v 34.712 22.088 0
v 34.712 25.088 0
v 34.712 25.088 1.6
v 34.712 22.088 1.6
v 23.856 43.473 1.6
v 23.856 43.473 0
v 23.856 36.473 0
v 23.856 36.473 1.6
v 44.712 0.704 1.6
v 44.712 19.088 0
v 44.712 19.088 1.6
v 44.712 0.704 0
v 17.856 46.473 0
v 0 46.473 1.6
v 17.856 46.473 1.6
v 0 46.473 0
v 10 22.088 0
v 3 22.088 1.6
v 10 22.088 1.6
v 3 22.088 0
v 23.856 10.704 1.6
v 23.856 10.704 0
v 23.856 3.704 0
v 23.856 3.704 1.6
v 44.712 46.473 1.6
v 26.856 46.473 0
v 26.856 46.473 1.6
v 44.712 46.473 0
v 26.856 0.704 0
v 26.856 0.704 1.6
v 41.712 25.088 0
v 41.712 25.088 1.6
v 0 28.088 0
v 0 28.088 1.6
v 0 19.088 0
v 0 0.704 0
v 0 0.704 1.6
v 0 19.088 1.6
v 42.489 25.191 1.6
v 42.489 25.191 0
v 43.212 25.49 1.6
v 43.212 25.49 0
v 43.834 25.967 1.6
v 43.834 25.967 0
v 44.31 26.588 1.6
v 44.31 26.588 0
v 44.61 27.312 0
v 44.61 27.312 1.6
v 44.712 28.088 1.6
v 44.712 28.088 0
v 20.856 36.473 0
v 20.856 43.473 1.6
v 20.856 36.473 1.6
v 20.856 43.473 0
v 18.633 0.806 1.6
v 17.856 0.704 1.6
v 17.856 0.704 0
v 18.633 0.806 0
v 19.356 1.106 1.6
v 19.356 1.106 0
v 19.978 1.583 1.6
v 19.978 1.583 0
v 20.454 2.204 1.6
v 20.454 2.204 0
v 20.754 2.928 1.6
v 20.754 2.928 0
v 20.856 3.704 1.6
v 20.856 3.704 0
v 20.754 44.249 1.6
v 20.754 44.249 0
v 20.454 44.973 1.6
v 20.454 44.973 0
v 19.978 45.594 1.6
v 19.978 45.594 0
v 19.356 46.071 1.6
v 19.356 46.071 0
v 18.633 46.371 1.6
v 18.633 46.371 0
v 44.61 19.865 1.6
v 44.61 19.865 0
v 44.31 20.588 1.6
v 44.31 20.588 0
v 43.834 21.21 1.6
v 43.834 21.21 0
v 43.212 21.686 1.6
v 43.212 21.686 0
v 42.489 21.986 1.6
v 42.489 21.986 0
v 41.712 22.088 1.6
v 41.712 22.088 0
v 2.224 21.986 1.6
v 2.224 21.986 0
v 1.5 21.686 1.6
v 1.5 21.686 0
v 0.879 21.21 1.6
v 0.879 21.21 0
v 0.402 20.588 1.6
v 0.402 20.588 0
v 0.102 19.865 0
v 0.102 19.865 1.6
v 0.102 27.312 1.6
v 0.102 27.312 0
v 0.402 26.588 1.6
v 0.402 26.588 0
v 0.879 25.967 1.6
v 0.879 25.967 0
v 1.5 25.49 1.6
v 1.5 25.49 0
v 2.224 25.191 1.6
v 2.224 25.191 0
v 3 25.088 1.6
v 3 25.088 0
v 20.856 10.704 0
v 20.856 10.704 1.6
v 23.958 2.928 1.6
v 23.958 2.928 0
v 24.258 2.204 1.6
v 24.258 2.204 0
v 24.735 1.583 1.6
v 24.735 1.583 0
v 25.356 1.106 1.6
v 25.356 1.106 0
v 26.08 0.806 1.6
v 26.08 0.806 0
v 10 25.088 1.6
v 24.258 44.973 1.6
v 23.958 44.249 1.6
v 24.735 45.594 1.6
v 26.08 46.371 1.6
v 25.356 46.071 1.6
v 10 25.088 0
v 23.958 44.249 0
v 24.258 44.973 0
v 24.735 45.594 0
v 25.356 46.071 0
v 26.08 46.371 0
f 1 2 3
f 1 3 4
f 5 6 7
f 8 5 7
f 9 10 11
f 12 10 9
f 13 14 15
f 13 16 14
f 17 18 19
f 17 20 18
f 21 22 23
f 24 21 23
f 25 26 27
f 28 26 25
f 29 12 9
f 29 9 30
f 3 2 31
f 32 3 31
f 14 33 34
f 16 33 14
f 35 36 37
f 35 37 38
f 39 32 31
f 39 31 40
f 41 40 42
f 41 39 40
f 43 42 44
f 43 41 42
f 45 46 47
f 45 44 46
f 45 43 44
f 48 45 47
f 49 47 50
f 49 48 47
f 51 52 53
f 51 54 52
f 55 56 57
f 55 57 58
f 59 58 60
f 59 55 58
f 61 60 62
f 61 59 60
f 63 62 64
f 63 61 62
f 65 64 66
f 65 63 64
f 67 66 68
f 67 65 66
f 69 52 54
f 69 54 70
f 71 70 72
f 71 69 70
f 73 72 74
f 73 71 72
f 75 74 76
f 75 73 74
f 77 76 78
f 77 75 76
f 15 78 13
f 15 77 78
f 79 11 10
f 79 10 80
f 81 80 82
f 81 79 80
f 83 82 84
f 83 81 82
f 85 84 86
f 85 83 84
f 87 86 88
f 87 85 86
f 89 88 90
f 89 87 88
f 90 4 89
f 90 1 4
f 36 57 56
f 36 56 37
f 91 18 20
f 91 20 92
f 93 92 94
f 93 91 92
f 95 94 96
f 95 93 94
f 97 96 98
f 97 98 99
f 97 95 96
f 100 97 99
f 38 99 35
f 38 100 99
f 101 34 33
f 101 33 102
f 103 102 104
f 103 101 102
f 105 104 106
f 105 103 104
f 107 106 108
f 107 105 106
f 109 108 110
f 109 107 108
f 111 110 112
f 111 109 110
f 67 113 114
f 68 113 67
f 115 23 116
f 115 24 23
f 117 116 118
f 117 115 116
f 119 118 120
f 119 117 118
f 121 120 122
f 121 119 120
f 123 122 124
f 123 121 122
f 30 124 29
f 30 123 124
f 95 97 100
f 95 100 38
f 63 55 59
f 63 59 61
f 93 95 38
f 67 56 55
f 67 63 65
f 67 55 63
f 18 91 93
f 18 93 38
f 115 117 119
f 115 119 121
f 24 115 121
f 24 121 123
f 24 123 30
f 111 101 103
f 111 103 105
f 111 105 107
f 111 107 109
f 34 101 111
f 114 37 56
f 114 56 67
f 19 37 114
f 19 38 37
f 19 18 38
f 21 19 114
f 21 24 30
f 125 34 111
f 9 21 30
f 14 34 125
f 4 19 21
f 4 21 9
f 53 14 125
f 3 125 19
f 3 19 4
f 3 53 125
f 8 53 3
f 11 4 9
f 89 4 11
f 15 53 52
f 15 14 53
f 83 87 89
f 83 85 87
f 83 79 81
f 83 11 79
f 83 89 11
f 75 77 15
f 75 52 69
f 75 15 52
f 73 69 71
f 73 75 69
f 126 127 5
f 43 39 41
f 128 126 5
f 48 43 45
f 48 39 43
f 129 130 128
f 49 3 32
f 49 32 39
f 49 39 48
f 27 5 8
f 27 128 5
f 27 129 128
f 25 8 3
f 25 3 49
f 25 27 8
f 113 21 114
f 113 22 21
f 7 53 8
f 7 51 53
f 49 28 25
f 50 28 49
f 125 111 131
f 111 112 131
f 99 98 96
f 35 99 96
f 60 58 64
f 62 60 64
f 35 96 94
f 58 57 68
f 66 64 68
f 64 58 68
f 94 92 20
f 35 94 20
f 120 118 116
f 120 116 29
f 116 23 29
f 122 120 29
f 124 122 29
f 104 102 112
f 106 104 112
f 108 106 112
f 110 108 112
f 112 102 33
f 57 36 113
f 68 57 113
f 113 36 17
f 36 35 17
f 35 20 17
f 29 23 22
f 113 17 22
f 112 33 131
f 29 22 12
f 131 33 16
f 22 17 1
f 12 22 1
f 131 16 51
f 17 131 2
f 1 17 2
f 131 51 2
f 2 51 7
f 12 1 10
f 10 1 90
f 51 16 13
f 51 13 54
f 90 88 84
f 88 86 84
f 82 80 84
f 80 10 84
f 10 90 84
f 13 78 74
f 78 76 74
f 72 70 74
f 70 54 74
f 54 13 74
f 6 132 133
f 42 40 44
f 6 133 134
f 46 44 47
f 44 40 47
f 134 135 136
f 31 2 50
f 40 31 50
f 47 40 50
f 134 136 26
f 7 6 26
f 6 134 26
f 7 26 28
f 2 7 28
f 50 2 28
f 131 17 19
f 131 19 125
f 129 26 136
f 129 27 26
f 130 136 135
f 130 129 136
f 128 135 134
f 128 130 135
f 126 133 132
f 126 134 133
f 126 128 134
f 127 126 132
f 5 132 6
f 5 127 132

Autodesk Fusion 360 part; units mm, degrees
sketch "Sketch1" plane through (0, 0, 0) normal (0, 0, 1) x (1, 0, 0)
  line L0 (0, 46.4728) -> (44.7124, 46.4728)
  line L1 (44.7124, 46.4728) -> (44.7124, 0.7041)
  line L2 (44.7124, 0.7041) -> (0, 0.7041)
  line L3 (0, 0.7041) -> (0, 46.4728)
  line L4 (34.7124, 10.7041) -> (10, 10.7041)
  line L5 (10, 10.7041) -> (10, 36.4728)
  line L6 (10, 36.4728) -> (34.7124, 36.4728)
  line L7 (34.7124, 36.4728) -> (34.7124, 10.7041)
  line L8 (22.3562, 46.4728) -> (22.3562, 0.7041) construction
  line L9 (0, 23.5884) -> (44.7124, 23.5884) construction
  line L10 (0, 22.0884) -> (44.7124, 22.0884)
  line L11 (0, 22.0884) -> (44.7124, 22.0884)
  line L12 (20.8562, 46.4728) -> (20.8562, 0.7041)
  line L13 (0, 25.0884) -> (44.7124, 25.0884)
  line L14 (23.8562, 46.4728) -> (23.8562, 0.7041)
  dimension "d1" = 10
  dimension "d2" = 1.5
  dimension "d3" = 1.5
extrude "Extrude1" add sketch "Sketch1" along normal blind 1.6 contours L0 L3 L5 L6 L12 L13 | L0 L1 L6 L7 L13 L14 | L5 L6 L12 L13 | L6 L12 L13 L14 | L2 L3 L4 L5 L10 L11 L12 | L5 L10 L11 L12 L13 | L6 L7 L13 L14 | L10 L11 L12 L13 L14 | L4 L5 L10 L11 L12 | L7 L10 L11 L13 L14 | L4 L10 L11 L12 L14 | L1 L2 L4 L7 L10 L11 L14 | L4 L7 L10 L11 L14
fillet "Fillet1" radius 3 5 edges at (0, 22.0884, 0.8) (0, 25.0884, 0.8) (20.8562, 0.7041, 0.8) (23.8562, 0.7041, 0.8) (44.7124, 25.0884, 0.8)
fillet "Fillet2" radius 3 3 edges at (23.8562, 46.4728, 0.8) (20.8562, 46.4728, 0.8) (44.7124, 22.0884, 0.8)
